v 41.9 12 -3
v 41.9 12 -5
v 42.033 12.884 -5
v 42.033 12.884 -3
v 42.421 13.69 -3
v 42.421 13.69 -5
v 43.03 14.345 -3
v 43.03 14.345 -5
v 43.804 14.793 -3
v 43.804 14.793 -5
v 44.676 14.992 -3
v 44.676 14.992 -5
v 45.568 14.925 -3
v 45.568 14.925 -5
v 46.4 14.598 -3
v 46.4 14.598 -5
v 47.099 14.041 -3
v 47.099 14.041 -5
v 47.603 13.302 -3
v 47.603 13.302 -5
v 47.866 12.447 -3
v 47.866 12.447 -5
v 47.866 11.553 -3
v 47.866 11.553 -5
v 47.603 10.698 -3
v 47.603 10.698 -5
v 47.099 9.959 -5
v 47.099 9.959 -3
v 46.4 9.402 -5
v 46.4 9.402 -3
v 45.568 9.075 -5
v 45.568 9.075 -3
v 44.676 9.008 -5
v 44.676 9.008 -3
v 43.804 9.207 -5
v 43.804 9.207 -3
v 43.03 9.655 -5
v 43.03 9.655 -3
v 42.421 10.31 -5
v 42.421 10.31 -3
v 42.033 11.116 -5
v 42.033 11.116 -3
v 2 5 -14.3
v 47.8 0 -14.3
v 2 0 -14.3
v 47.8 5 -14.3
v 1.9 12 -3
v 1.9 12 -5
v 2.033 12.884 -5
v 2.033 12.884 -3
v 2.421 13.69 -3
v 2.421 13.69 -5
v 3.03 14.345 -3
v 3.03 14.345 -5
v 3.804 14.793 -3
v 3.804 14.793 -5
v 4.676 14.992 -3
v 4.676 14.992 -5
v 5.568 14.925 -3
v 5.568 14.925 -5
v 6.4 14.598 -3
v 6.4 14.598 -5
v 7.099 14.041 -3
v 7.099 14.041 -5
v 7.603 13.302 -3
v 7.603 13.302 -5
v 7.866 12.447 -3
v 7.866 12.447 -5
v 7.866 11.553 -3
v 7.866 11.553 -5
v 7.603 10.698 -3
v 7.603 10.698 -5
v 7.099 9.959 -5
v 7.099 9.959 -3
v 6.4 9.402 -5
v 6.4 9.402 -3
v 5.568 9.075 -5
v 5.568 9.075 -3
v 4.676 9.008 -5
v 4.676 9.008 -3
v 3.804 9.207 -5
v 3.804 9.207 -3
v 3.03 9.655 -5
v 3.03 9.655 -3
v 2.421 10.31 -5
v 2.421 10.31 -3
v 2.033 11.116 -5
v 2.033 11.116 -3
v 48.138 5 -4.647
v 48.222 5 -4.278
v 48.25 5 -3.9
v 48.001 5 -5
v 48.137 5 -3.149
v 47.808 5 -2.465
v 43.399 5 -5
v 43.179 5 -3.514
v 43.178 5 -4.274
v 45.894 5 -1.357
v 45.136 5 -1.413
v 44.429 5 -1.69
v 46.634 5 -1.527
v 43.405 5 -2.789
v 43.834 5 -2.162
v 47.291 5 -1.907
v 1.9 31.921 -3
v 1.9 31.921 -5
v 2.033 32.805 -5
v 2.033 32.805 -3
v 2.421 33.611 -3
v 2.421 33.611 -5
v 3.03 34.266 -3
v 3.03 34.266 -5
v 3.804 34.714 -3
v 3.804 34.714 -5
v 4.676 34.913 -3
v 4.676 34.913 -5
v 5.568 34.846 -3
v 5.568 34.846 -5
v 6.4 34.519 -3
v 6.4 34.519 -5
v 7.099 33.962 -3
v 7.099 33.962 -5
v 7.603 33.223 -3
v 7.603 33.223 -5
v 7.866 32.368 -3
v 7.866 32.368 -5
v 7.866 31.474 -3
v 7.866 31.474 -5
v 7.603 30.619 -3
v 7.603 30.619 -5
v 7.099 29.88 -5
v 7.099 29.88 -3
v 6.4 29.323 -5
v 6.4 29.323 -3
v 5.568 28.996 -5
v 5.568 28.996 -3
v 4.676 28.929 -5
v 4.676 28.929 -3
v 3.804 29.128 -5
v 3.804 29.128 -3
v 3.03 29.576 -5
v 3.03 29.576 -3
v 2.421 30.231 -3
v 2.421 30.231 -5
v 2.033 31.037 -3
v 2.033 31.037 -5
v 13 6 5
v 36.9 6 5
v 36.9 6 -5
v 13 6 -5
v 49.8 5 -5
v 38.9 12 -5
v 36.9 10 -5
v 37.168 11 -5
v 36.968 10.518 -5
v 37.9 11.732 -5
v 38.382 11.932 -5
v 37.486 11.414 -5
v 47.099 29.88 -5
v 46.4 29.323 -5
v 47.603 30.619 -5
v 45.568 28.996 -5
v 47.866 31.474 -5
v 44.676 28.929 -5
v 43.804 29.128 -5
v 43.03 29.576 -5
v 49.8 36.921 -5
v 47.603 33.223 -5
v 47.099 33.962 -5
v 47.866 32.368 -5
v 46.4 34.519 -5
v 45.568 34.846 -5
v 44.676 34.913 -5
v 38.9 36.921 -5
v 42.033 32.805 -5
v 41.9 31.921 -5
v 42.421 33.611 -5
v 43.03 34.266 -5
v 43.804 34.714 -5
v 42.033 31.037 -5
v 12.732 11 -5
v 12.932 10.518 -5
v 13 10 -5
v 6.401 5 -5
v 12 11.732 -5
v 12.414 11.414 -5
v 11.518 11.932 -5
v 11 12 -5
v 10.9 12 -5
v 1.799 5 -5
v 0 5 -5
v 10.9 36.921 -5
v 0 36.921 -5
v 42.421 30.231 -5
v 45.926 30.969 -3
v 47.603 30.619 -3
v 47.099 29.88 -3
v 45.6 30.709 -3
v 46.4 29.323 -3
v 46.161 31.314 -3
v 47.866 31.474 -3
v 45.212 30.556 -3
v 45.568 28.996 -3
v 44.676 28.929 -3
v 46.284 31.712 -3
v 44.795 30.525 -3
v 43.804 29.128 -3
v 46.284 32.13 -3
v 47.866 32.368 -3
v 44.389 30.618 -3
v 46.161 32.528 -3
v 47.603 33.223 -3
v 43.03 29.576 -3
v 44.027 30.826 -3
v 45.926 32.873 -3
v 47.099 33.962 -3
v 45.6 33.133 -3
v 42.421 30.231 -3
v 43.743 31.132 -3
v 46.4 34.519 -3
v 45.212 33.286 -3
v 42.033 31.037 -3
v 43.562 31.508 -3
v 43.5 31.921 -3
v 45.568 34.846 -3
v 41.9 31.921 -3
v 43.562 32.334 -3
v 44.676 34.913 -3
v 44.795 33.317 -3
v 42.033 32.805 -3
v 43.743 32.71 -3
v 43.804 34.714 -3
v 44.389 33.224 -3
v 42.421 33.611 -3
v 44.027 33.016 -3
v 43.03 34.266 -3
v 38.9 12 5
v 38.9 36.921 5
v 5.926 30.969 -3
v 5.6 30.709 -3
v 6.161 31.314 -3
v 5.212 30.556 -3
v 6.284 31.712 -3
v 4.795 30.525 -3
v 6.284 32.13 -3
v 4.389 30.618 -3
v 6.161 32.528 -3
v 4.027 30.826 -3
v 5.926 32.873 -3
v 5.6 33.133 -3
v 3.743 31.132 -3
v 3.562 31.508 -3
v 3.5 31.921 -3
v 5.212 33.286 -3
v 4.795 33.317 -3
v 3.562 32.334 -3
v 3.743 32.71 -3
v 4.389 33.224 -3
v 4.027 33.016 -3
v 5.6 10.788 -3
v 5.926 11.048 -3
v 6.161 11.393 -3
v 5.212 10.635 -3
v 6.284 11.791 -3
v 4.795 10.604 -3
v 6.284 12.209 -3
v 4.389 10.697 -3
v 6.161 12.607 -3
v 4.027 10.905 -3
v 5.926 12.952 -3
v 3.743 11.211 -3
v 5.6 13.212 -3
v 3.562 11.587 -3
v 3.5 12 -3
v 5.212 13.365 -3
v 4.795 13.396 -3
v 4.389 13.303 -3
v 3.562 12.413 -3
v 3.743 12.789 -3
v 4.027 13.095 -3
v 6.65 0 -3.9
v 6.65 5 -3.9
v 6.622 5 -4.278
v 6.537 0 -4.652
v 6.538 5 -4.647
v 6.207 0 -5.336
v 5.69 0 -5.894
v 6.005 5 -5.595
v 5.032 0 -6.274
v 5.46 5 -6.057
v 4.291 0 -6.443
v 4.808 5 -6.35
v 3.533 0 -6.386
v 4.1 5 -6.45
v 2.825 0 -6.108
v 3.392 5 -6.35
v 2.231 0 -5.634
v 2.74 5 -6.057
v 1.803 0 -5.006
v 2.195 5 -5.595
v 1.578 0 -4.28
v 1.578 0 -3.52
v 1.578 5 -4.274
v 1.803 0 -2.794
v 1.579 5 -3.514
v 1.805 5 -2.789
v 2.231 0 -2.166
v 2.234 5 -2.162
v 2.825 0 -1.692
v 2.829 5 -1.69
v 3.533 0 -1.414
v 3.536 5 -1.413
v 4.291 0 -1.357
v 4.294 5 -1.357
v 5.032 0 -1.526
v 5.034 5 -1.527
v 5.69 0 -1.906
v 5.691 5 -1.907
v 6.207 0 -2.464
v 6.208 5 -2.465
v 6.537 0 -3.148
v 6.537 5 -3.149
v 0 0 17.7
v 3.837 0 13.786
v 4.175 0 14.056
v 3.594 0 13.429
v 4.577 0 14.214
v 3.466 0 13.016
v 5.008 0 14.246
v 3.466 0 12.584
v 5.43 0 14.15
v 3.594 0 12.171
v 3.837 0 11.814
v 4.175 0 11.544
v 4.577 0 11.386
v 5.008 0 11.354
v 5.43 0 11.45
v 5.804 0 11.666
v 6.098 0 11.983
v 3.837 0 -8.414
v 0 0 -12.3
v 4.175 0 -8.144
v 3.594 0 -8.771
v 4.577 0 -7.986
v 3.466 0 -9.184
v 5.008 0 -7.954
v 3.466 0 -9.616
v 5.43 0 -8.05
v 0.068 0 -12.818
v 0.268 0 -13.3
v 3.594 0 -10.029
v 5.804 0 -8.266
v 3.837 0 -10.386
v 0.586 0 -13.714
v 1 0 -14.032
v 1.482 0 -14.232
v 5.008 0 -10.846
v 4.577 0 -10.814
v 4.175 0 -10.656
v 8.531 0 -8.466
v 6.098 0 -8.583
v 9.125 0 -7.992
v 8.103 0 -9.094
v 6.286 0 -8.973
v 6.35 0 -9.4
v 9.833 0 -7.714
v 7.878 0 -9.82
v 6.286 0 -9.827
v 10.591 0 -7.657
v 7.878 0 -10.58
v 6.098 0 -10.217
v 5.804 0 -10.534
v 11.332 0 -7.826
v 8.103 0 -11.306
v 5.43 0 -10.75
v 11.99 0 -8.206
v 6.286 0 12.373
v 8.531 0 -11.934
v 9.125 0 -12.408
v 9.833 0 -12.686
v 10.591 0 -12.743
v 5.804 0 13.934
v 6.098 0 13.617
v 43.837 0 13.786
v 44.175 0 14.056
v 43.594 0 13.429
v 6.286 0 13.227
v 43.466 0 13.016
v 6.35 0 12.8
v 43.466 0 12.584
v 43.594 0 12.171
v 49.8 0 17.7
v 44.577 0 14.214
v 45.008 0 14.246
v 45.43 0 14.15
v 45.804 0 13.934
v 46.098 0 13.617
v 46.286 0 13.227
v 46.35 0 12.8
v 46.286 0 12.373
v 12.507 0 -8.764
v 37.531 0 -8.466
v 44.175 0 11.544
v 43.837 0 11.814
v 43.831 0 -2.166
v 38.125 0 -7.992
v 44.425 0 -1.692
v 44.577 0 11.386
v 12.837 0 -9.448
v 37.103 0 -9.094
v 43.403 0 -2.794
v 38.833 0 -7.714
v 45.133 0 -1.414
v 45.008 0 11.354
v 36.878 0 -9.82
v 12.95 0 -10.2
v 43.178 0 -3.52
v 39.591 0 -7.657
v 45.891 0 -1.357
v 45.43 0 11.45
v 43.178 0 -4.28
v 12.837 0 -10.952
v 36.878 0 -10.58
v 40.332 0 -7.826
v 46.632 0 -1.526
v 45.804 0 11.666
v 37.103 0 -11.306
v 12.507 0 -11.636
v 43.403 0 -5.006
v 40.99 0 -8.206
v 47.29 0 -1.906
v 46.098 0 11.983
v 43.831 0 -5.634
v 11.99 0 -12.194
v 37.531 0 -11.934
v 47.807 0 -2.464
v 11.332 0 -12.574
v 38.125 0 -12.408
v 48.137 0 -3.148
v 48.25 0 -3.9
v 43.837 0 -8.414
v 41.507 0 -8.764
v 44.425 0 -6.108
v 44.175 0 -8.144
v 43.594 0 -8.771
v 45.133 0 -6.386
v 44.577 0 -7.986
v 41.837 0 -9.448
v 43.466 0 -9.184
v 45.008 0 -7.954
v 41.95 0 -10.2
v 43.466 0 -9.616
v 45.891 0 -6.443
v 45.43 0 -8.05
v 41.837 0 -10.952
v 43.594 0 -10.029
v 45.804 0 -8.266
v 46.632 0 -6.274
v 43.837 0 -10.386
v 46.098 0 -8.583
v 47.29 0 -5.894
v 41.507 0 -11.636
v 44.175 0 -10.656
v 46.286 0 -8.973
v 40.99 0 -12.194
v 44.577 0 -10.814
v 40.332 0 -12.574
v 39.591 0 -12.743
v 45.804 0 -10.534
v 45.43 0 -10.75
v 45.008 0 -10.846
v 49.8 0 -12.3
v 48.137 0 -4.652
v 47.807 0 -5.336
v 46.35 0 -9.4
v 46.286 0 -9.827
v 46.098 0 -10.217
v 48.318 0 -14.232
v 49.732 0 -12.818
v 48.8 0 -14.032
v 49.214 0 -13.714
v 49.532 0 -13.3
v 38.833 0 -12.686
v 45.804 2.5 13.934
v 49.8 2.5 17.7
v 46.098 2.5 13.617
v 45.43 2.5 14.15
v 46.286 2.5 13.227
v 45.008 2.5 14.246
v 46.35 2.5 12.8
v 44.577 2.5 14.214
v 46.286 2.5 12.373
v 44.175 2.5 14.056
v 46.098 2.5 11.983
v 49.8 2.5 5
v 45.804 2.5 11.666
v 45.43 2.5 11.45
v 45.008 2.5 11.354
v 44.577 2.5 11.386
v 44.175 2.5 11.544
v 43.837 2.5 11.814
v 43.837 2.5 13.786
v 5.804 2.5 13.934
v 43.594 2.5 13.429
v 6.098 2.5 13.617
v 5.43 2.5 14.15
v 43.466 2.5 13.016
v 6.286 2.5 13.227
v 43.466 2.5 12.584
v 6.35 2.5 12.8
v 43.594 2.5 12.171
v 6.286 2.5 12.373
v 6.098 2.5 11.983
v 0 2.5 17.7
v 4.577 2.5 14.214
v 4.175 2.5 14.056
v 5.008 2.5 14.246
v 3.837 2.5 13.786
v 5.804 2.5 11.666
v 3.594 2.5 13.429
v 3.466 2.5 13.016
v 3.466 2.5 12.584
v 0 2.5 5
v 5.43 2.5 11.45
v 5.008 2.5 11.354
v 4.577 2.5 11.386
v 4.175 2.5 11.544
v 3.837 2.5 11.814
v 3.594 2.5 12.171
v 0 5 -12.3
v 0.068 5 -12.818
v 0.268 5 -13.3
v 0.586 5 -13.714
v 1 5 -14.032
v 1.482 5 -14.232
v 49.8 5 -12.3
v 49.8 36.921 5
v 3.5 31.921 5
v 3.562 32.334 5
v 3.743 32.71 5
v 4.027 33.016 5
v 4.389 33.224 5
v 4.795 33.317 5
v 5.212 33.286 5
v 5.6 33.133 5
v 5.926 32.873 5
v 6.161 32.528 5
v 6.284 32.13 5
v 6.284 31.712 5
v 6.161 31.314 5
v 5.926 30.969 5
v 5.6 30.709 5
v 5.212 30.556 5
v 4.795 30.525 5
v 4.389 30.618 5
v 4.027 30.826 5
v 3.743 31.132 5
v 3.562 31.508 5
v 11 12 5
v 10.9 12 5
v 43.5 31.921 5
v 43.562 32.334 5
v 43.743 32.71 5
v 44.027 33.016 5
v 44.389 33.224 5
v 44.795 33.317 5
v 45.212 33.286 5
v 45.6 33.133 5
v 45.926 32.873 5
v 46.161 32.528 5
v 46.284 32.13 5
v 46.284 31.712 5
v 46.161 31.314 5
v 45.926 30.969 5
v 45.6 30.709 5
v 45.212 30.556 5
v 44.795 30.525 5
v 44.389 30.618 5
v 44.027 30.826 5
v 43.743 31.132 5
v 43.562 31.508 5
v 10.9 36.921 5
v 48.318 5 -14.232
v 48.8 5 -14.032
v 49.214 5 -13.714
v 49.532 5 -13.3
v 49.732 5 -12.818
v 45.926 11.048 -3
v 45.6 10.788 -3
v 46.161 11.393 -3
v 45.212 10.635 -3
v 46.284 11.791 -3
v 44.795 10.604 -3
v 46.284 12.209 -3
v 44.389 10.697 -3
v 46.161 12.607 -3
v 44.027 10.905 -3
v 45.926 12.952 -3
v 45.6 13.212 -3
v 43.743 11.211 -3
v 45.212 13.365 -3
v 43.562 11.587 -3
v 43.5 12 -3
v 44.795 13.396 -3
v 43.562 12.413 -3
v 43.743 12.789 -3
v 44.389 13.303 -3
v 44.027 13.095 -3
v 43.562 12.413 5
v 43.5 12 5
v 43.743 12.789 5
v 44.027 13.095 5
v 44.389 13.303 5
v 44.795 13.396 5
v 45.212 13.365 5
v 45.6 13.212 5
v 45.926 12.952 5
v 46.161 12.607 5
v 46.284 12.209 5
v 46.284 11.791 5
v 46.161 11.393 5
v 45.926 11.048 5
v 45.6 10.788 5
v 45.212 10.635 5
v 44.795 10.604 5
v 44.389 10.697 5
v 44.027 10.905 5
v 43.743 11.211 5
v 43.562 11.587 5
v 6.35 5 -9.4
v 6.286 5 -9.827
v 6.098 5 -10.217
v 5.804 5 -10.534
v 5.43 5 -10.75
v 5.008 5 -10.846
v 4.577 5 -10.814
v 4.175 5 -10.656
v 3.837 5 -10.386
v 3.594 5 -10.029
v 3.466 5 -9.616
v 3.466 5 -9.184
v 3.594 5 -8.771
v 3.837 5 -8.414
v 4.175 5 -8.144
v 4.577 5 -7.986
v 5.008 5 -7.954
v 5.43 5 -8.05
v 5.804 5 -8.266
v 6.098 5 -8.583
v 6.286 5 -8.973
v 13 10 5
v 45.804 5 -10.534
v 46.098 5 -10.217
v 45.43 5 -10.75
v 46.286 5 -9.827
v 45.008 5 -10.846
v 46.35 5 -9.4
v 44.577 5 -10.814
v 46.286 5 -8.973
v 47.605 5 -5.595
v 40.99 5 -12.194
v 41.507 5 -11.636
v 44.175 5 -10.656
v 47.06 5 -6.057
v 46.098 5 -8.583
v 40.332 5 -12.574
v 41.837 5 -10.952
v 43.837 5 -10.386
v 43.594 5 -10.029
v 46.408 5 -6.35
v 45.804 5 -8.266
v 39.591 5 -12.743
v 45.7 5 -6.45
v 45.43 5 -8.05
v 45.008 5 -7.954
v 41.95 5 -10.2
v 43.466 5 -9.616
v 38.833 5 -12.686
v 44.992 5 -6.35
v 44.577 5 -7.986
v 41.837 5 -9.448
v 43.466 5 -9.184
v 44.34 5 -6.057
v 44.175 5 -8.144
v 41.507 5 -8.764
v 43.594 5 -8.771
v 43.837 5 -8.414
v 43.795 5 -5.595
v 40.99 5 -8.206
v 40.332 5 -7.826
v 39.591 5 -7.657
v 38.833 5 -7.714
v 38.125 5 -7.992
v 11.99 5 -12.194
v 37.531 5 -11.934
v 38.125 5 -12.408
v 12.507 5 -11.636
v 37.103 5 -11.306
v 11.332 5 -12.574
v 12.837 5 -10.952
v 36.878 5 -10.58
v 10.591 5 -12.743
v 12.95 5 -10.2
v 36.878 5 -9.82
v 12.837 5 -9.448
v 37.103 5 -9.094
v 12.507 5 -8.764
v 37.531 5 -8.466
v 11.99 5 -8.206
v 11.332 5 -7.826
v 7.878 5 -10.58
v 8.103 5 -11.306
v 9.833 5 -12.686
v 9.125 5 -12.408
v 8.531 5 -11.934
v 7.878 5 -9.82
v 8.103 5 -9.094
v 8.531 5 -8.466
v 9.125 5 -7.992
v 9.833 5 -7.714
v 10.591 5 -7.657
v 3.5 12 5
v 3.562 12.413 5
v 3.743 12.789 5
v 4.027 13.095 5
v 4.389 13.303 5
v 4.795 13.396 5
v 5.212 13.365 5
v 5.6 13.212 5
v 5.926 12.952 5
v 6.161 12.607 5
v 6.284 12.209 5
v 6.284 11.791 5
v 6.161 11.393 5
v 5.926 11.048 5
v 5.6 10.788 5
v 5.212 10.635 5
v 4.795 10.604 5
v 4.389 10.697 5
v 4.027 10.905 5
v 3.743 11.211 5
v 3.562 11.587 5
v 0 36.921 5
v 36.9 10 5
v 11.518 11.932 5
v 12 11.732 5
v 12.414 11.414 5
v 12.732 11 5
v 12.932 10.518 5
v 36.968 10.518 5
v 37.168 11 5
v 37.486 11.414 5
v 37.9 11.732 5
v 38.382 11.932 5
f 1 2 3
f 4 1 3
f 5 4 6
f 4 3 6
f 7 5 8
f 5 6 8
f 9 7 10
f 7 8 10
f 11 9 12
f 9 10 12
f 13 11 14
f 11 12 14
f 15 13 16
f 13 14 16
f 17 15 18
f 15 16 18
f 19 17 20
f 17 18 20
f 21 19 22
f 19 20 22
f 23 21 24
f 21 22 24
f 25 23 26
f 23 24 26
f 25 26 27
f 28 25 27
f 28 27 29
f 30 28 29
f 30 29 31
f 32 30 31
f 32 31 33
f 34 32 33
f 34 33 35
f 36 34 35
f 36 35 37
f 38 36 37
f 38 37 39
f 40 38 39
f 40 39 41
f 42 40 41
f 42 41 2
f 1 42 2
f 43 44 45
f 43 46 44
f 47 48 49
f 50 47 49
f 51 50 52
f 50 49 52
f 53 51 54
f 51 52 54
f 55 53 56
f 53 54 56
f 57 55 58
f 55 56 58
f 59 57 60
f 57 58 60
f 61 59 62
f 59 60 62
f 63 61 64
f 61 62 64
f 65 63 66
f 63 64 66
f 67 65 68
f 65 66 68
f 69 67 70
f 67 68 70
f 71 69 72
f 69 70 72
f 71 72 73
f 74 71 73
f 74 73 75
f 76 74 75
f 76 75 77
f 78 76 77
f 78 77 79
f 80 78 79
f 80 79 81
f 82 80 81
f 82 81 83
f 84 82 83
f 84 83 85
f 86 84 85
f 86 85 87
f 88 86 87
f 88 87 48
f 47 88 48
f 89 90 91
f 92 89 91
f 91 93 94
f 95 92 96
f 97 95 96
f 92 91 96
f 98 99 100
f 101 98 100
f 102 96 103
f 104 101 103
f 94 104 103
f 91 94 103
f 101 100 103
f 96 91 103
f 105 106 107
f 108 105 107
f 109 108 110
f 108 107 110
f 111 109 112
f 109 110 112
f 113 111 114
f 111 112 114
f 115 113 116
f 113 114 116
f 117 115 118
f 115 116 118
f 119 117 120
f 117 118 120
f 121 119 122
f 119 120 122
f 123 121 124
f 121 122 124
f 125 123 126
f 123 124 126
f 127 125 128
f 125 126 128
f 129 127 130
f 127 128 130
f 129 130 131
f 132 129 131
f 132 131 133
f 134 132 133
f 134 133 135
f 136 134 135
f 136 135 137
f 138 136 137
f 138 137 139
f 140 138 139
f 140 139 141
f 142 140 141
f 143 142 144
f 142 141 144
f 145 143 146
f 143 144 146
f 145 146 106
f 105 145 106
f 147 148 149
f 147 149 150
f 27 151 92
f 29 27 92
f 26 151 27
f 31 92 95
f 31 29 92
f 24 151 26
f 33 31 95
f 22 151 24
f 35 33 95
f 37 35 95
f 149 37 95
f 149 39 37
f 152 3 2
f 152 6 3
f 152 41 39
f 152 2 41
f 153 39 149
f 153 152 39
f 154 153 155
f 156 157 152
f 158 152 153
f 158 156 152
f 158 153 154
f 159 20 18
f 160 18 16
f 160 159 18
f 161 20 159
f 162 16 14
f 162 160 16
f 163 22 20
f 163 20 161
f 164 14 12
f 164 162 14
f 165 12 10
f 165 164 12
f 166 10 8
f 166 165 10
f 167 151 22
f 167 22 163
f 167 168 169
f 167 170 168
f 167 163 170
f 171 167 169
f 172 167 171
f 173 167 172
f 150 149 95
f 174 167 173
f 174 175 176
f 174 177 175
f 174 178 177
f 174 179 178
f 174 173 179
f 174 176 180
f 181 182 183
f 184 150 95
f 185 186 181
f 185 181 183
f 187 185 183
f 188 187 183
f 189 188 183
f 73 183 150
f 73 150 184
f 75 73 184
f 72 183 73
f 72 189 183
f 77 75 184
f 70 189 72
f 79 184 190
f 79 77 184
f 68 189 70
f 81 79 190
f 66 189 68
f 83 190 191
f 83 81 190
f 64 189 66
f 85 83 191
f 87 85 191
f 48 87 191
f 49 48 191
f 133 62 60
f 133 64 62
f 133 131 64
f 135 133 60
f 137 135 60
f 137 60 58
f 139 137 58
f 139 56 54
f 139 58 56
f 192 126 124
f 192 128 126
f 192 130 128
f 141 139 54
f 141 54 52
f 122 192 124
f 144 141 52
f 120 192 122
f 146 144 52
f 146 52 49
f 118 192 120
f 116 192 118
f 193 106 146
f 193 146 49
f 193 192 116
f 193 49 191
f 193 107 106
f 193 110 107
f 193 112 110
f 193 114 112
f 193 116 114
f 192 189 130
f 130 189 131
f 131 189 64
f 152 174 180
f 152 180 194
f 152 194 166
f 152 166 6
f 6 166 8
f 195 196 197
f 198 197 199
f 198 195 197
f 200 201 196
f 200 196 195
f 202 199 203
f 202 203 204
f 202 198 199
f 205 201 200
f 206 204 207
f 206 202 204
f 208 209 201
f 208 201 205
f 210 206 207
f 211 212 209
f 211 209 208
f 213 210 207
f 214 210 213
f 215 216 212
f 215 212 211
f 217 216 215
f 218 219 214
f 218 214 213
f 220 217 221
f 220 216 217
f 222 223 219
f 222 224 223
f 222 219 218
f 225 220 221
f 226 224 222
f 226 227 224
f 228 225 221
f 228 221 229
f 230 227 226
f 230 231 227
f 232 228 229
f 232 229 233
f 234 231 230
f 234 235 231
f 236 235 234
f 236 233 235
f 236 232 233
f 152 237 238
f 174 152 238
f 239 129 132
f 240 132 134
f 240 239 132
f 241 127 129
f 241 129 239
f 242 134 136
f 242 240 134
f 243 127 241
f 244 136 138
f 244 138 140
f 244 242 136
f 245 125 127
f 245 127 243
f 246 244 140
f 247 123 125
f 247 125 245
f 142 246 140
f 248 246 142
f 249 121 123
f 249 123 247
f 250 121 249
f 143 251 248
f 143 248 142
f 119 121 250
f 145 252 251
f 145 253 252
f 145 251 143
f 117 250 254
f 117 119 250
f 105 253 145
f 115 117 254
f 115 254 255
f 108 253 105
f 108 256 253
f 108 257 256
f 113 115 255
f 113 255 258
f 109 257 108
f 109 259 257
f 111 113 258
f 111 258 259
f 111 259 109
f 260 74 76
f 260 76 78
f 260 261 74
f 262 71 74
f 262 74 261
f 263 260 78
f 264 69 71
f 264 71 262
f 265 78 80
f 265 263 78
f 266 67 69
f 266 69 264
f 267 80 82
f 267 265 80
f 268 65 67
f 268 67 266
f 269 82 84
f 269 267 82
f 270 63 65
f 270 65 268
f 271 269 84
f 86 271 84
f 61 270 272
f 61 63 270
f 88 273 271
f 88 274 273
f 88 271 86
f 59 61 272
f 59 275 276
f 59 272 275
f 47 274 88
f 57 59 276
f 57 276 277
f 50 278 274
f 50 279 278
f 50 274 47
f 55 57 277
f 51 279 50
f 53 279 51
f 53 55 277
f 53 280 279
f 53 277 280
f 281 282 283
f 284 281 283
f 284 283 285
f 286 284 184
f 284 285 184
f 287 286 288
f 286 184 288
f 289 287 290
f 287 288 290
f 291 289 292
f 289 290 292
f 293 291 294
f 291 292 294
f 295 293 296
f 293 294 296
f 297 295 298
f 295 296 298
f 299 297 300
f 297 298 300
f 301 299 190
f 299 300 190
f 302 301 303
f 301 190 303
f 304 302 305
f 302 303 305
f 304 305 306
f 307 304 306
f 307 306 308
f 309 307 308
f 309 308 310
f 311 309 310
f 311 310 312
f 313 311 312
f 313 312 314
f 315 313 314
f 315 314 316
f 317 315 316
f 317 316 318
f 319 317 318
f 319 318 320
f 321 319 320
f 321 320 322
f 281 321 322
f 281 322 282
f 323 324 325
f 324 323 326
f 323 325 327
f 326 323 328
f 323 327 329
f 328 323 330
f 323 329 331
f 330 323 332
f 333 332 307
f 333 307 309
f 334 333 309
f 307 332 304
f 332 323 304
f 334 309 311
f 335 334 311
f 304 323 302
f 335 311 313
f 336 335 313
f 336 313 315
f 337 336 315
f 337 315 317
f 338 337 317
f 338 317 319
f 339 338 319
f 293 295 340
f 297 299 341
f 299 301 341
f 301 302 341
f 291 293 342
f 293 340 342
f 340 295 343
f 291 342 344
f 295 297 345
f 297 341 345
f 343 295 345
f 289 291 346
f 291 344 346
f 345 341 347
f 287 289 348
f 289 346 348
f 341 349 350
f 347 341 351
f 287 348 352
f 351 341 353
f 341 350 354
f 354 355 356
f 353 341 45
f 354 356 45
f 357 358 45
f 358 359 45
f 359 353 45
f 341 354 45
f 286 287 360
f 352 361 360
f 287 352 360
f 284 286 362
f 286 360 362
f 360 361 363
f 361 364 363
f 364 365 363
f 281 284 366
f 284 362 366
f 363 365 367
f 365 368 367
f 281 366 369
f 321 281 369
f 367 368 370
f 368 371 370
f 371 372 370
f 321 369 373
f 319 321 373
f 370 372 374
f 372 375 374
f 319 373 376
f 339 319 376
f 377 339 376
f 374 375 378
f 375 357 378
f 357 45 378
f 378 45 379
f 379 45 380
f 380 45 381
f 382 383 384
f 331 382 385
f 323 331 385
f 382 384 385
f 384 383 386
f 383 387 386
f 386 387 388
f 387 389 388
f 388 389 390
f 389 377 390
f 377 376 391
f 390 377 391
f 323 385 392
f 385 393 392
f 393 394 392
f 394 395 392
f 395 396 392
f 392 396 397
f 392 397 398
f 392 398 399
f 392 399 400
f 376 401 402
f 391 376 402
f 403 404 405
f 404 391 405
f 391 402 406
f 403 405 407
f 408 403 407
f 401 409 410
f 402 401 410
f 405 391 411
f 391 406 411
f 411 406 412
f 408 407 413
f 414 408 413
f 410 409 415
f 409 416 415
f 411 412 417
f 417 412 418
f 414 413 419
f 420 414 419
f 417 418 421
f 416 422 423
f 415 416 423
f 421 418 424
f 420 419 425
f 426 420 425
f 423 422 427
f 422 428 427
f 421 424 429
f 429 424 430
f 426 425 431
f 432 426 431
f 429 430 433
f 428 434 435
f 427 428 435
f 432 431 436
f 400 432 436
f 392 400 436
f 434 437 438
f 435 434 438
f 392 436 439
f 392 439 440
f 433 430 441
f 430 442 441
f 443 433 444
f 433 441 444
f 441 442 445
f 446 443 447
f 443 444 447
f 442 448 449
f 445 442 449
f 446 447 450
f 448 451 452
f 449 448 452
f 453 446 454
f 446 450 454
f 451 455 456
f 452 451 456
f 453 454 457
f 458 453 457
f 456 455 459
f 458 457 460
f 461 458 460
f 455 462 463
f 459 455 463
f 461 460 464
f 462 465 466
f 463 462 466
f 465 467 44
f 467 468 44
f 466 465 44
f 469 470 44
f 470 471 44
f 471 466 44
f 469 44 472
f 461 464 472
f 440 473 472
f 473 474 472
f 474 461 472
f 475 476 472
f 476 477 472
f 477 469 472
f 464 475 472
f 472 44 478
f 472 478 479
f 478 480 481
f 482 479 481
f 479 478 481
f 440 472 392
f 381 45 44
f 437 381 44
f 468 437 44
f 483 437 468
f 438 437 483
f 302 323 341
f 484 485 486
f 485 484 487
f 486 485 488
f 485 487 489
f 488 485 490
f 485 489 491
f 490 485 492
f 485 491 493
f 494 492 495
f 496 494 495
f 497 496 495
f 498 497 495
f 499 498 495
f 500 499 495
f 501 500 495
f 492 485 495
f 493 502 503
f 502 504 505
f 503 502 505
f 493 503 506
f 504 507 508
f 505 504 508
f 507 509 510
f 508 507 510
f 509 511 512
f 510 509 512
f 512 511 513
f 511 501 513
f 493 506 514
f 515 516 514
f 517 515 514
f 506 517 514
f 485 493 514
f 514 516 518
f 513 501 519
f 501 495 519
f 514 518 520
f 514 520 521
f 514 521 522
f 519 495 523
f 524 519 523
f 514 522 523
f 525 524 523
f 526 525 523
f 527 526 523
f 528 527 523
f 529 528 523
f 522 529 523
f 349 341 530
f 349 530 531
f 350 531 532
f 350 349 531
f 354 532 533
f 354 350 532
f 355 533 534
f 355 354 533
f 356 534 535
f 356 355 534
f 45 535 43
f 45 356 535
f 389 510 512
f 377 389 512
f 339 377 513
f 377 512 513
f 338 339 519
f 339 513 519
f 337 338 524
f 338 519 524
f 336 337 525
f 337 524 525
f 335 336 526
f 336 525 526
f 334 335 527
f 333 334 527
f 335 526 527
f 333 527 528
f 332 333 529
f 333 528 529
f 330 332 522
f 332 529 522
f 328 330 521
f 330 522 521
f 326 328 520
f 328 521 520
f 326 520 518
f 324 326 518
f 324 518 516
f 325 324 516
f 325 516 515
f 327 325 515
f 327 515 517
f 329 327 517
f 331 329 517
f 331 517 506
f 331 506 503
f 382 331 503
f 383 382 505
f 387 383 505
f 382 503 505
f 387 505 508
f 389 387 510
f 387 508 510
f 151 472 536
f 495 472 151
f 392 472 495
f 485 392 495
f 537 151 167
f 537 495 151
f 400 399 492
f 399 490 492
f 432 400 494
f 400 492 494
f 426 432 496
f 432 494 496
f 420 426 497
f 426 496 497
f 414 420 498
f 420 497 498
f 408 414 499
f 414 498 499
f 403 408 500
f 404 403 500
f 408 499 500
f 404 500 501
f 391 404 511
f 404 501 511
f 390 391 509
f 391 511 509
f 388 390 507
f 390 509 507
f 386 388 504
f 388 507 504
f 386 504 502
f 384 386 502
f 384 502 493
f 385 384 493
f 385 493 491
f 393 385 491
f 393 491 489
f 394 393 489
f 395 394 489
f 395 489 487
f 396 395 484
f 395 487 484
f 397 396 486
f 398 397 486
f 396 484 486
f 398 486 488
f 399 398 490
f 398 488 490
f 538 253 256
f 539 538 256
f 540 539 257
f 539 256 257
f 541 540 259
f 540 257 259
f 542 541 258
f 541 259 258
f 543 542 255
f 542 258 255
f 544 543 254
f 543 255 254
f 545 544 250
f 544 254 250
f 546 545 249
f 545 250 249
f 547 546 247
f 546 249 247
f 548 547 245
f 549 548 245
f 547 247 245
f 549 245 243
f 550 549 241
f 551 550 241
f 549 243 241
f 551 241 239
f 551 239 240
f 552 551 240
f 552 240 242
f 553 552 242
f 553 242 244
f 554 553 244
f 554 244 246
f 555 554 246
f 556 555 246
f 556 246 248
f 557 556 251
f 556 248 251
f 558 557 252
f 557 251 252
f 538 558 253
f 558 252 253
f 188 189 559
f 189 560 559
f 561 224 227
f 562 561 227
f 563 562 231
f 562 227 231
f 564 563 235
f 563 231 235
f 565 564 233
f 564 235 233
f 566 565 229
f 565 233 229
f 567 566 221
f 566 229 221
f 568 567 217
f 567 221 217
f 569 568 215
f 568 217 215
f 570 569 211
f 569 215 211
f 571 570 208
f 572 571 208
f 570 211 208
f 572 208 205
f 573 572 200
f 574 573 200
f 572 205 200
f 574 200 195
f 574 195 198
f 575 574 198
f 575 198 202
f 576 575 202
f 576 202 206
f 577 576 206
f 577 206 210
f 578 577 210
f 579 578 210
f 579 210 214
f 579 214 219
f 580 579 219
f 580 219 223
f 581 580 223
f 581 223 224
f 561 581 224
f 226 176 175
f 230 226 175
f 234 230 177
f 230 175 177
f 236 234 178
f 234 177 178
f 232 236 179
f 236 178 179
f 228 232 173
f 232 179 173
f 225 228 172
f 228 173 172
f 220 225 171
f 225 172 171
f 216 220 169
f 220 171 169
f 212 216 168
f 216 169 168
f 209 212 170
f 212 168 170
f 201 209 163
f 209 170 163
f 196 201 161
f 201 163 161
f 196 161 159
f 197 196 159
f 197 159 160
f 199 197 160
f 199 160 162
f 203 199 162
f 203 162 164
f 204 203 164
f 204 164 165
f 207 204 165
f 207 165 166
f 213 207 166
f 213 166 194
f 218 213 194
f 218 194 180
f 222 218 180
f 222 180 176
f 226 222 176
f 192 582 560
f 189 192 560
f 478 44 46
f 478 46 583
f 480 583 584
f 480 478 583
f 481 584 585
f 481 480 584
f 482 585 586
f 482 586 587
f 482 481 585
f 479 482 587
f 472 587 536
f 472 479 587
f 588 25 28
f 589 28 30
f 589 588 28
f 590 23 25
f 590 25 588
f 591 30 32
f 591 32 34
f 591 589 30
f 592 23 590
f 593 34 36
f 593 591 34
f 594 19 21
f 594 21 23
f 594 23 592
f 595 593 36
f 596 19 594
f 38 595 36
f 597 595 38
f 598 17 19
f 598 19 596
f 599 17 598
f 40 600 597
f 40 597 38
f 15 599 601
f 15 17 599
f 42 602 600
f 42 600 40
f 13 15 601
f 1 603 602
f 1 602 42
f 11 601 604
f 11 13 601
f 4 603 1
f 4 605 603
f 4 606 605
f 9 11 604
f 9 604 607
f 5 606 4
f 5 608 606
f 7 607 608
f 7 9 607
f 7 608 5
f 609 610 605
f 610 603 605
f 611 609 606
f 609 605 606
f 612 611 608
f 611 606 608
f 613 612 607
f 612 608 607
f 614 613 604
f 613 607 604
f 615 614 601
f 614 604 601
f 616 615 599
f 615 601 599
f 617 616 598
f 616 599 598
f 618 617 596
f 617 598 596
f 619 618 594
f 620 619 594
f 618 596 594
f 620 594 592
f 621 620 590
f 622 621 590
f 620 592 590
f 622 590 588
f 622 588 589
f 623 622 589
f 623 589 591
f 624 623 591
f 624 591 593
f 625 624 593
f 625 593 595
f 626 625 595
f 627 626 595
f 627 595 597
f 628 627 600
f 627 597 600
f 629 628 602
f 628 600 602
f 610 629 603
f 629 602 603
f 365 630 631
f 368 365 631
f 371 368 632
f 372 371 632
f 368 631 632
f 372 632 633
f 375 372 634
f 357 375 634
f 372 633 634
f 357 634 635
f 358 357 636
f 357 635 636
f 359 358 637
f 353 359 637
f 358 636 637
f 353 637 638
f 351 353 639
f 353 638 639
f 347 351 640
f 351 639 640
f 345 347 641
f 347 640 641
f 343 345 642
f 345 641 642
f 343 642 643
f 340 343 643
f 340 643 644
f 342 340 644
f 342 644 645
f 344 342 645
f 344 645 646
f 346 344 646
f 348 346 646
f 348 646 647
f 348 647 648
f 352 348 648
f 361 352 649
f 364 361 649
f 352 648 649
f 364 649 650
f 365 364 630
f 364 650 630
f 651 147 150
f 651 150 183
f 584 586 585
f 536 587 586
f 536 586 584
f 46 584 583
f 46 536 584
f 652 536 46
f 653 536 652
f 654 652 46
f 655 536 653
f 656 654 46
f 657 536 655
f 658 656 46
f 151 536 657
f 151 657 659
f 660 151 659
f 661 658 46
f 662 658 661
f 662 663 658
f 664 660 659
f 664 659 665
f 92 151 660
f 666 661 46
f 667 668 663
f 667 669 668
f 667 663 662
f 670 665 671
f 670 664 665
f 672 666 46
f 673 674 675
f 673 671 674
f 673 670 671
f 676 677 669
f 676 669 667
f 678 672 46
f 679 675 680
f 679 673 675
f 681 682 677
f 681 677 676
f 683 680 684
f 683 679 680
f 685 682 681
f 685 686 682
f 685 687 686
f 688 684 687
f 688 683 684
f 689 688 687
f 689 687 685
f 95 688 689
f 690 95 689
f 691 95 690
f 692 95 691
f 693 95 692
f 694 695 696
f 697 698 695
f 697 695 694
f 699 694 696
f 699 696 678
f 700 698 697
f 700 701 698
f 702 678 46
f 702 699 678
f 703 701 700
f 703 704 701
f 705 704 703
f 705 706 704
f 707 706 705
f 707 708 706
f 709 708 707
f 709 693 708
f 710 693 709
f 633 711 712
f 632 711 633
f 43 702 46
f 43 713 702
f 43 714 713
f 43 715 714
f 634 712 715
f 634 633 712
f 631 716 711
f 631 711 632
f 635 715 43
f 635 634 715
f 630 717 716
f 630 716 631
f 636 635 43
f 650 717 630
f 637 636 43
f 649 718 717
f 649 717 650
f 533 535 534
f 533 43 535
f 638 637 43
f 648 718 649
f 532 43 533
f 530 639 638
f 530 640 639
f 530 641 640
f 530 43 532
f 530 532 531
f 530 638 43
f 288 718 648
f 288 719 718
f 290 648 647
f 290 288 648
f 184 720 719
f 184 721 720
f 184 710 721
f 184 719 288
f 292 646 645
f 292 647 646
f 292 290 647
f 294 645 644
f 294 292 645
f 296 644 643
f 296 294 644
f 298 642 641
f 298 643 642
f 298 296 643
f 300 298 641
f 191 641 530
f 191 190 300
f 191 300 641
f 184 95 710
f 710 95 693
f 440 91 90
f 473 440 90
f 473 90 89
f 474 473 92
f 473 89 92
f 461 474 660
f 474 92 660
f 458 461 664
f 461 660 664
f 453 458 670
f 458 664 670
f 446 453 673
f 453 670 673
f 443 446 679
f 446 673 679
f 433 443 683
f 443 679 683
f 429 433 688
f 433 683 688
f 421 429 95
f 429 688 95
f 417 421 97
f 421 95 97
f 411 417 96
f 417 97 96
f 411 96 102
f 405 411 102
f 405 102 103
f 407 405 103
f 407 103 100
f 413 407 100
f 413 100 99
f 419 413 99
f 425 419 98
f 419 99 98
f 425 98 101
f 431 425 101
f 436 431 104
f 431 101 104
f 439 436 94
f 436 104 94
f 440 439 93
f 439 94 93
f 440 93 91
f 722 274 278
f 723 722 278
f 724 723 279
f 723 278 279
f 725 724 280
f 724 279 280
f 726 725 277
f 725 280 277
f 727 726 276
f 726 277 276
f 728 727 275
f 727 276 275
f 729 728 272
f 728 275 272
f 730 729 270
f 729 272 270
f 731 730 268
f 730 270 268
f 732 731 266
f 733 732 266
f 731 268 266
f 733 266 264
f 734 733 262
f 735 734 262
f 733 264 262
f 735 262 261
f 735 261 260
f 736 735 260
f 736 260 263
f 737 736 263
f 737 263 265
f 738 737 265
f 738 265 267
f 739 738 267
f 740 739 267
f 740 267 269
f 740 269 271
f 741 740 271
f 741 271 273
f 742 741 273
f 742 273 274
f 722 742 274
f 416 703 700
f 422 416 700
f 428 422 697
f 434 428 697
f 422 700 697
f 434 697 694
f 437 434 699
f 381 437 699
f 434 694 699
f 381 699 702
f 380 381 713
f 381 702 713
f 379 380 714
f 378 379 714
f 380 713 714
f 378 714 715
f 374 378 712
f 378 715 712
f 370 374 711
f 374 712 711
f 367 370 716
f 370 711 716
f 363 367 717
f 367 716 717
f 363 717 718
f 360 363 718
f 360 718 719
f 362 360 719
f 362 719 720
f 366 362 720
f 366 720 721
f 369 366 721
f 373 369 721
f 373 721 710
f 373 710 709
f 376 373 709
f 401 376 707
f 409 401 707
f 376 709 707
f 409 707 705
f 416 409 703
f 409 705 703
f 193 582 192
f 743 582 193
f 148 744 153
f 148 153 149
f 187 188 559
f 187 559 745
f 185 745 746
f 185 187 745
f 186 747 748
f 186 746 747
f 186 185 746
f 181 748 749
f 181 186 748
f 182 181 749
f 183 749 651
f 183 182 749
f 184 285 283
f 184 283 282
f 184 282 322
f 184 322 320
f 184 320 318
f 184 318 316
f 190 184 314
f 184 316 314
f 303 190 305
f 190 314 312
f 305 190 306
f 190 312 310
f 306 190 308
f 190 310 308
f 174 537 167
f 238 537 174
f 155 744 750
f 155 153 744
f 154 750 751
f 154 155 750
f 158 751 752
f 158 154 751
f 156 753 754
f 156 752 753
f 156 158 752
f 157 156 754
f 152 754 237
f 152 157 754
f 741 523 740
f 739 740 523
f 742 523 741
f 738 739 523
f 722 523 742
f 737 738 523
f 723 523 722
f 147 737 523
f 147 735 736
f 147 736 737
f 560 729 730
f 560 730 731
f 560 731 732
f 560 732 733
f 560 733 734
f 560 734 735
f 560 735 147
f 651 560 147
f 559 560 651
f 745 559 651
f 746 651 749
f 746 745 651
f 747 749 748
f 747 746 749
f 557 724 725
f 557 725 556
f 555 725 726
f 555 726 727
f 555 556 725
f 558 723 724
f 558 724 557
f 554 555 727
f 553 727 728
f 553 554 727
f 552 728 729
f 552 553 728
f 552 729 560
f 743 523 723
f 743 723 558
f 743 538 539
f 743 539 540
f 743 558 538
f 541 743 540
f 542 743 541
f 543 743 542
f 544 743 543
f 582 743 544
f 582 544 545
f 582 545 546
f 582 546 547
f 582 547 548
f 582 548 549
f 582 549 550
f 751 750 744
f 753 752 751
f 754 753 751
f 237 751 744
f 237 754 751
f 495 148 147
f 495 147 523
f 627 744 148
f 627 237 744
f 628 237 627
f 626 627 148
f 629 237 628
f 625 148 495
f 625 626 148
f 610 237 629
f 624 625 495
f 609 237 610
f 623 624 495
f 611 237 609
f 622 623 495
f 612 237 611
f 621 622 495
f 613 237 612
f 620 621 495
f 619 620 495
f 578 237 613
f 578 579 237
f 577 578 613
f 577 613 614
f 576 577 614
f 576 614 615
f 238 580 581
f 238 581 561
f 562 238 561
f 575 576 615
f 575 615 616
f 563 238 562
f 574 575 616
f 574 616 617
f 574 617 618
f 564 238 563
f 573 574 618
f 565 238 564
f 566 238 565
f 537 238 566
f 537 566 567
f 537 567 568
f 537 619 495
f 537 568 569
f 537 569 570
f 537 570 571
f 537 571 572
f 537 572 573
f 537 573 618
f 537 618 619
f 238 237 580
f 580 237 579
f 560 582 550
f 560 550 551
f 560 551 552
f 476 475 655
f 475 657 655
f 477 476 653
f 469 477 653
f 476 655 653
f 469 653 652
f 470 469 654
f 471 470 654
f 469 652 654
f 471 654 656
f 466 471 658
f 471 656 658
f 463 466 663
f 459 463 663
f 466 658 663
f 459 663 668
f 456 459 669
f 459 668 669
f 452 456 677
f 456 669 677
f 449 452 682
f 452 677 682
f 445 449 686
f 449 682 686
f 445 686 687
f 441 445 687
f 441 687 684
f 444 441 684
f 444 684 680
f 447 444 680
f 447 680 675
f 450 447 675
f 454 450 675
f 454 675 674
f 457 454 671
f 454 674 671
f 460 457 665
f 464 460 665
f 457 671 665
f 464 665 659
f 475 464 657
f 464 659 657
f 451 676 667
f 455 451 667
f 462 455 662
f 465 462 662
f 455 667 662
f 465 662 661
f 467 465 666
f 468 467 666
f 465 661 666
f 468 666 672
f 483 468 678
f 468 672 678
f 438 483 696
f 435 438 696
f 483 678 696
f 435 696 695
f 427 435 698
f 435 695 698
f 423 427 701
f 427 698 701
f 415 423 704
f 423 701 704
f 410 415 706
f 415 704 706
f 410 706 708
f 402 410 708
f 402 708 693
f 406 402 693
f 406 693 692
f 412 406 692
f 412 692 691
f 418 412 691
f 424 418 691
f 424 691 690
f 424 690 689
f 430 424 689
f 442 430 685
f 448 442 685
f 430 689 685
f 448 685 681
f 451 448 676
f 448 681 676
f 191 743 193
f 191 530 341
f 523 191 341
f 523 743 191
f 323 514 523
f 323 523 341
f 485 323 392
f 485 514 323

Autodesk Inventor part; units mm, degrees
ref_plane "YZ Plane" through (0, 0, 0) normal (1, 0, 0) x (0, 1, 0)
ref_plane "XZ Plane" through (0, 0, 0) normal (0, 1, 0) x (-1, 0, 0)
ref_plane "XY Plane" through (0, 0, 0) normal (0, 0, 1) x (1, 0, 0)
sketch "Sketch1" plane through (0, 0, 0) normal (0, 0, 1) x (1, 0, 0)
  line L0 (0, 0) -> (49.8, 0)
  line L1 (49.8, 0) -> (49.8, 36.921)
  line L2 (49.8, 36.921) -> (0, 36.921)
  line L3 (0, 36.921) -> (0, 0)
  dimension "d0" = 49.8
  dimension "d1" = 36.921
extrude "Extrusion1" add sketch "Sketch1" along normal blind 5
sketch "Sketch2" plane through (0, 0, 0) normal (0, 0, -1) x (-1, 0, 0)
  line L0 (0, 0) -> (-49.8, 0) projected
  line L1 (0, 0) -> (-49.8, 0)
  line L2 (-49.8, 0) -> (-49.8, 5)
  line L3 (-49.8, 5) -> (0, 5)
  line L4 (0, 5) -> (0, 0)
  dimension "d4" = 49.8
  dimension "d5" = 5
extrude "Extrusion2" add sketch "Sketch2" along normal blind 30
sketch "Sketch4" plane through (0, 0, 0) normal (0, 0, -1) x (-1, 0, 0)
  line L0 (-38.9, 36.921) -> (-10.9, 36.921)
  line L1 (-10.9, 36.921) -> (-10.9, 12)
  line L2 (-10.9, 12) -> (-38.9, 12)
  line L3 (-38.9, 12) -> (-38.9, 36.921)
  line L4 (0, 36.921) -> (0, 5) projected
  line L5 (0, 5) -> (-49.8, 5) projected
  point P0 (0, 0)
  dimension "d24" = 28
  dimension "d25" = 24.921
  dimension "d26" = 10.9
  dimension "d27" = 7
extrude "Extrusion3" cut sketch "Sketch4" against normal through all
sketch "Sketch6" plane through (0, 5, 0) normal (0, 1, 0) x (1, 0, 0)
  line L0 (0, -32.5) -> (49.8, -32.5)
  line L1 (49.8, -32.5) -> (49.8, 17.3)
  line L2 (49.8, 17.3) -> (0, 17.3)
  line L3 (0, 17.3) -> (0, -32.5)
  circle A0 centre (44.9, 9.4) radius 1.45
  circle A1 centre (4.9, 9.4) radius 1.45
  line L4 (24.9, 17.3) -> (24.9, 7.3)
  circle A2 centre (45.7, 3.9) radius 2.55
  circle A3 centre (39.4, 10.2) radius 2.55
  circle A4 centre (4.1, 3.9) radius 2.55
  circle A5 centre (10.4, 10.2) radius 2.55
  line L5 (49.8, 0) -> (49.8, 30) projected
  line L6 (0, 17.3) -> (49.8, 17.3)
  line L7 (49.8, 17.3) -> (49.8, 30)
  line L8 (49.8, 30) -> (0, 30)
  line L9 (0, 30) -> (0, 17.3)
  line L10 (49.8, 30) -> (49.8, -5) projected
  line L11 (0, 17.3) -> (49.8, 17.3)
  line L12 (49.8, 17.3) -> (49.8, 14.3)
  line L13 (49.8, 14.3) -> (0, 14.3)
  line L14 (0, 14.3) -> (0, 17.3)
  point P0 (0, 0)
  dimension "d36" = 49.8
  dimension "d37" = 49.8
  dimension "d38" = 2.9
  dimension "d39" = 4.9
  dimension "d40" = 7.9
  dimension "d41" = 2.9
  dimension "d42" = 4.9
  dimension "d43" = 7.9
  dimension "d44" = 10
  dimension "d45" = 5.1
  dimension "d46" = 5.1
  dimension "d47" = 4.1
  dimension "d48" = 13.4
  dimension "d49" = 10.4
  dimension "d50" = 7.1
  dimension "d64" = 3
extrude "Extrusion5" cut sketch "Sketch6" against normal through all contours L3 L2 L4 L13 | L9 L8 L5 L2 | L4 L2 L1 L13 | A0 | A1 | A2 | A3 | A4 | A5
sketch "Sketch8" plane through (0, 0, 5) normal (0, 0, 1) x (1, 0, 0)
  line L0 (0, 0) -> (49.8, 0) projected
  line L1 (0, 0) -> (49.8, 0)
  line L2 (49.8, 0) -> (49.8, 2.5)
  line L3 (49.8, 2.5) -> (0, 2.5)
  line L4 (0, 2.5) -> (0, 0)
  dimension "d53" = 2.5
extrude "Extrusion6" add sketch "Sketch8" along normal blind 12.7
sketch "Sketch9" plane through (0, 2.5, 5) normal (0, 1, 0) x (1, 0, 0)
  circle A0 centre (44.9, -7.8) radius 1.45
  circle A1 centre (4.9, -7.8) radius 1.45
  line L0 (0, 0) -> (0, -12.7) projected
  line L1 (49.8, -12.7) -> (0, -12.7) projected
  line L2 (49.8, 0) -> (49.8, -12.7) projected
  point P0 (0, 5)
  dimension "d56" = 2.9
  dimension "d57" = 2.9
  dimension "d58" = 4.9
  dimension "d59" = 4.9
  dimension "d60" = 4.9
  dimension "d61" = 4.9
extrude "Extrusion7" cut sketch "Sketch9" against normal through all
fillet "Fillet1" radius 2 2 edges at (49.8, 2.5, -14.3) (0, 2.5, -14.3)
sketch "Sketch10" plane through (0, 0, 0) normal (0, 0, -1) x (-1, 0, 0)
  line L0 (-10.9, 36.921) -> (-10.9, 12) projected
  line L1 (-10.9, 12) -> (-38.9, 12) projected
  line L2 (-38.9, 12) -> (-38.9, 36.921) projected
  line L3 (-49.8, 36.921) -> (-38.9, 36.921) projected
  line L4 (-49.8, 5) -> (-49.8, 36.921) projected
  line L5 (-49.8, 5) -> (0, 5) projected
  line L6 (0, 36.921) -> (0, 5) projected
  line L7 (-10.9, 36.921) -> (0, 36.921) projected
  line L8 (-10.9, 18.4272) -> (-10.9, 27.6034)
  point P0 (0, 0)
extrude "Extrusion8" add sketch "Sketch10" along normal blind 5
sketch "Sketch3" plane through (0, 0, 0) normal (0, 0, -1) x (-1, 0, 0)
  circle A0 centre (-44.9, 31.921) radius 1.4
  circle A1 centre (-4.9, 31.921) radius 1.4
  circle A2 centre (-4.9, 12) radius 1.4
  line L0 (-49.8, 5) -> (-49.8, 36.921) projected
  line L1 (-49.8, 36.921) -> (0, 36.921) projected
  line L2 (0, 36.921) -> (0, 5) projected
  line L3 (0, 5) -> (-49.8, 5) projected
  circle A3 centre (-44.9, 12) radius 1.4
  point P0 (0, 0)
  dimension "d8" = 2.8
  dimension "d9" = 2.8
  dimension "d10" = 2.8
  dimension "d11" = 4.9
  dimension "d12" = 5
  dimension "d13" = 5
  dimension "d14" = 4.9
  dimension "d15" = 4.9
  dimension "d16" = 7
  dimension "d30" = 2.8
  dimension "d31" = 4.9
  dimension "d32" = 7
extrude "Extrusion9" cut sketch "Sketch3" against normal blind 5 and the other way blind 5 contours A0 | A1 | A2 | A3
sketch "Sketch11" plane through (0, 0, -5) normal (0, 0, -1) x (-1, 0, 0)
  circle A0 centre (-44.9, 31.921) radius 1.4 projected
  circle A1 centre (-44.9, 31.921) radius 3
  circle A2 centre (-44.9, 12) radius 1.4 projected
  circle A3 centre (-44.9, 12) radius 3
  circle A4 centre (-4.9, 31.921) radius 1.4 projected
  circle A5 centre (-4.9, 31.921) radius 3
  circle A6 centre (-4.9, 12) radius 1.4 projected
  circle A7 centre (-4.9, 12) radius 3
  point P0 (0, 0)
  dimension "d72" = 6
  dimension "d73" = 6
  dimension "d74" = 6
  dimension "d75" = 6
extrude "Extrusion10" cut sketch "Sketch11" against normal blind 2
sketch "Sketch12" plane through (0, 0, 5) normal (0, 0, 1) x (1, 0, 0)
  line L0 (38.9, 12) -> (10.9, 12) projected
  line L1 (13, 12) -> (36.9, 12)
  line L2 (36.9, 12) -> (36.9, 6)
  line L3 (36.9, 6) -> (13, 6)
  line L4 (13, 6) -> (13, 12)
  point P0 (0, 0)
  dimension "d78" = 23.9
  dimension "d79" = 6
extrude "Extrusion11" cut sketch "Sketch12" against normal blind 10
fillet "Fillet2" radius 2 2 edges at (13, 12, 0) (36.9, 12, 0)
properties part number "30_CUBE_openSIM_DMD_Fixation_base"
